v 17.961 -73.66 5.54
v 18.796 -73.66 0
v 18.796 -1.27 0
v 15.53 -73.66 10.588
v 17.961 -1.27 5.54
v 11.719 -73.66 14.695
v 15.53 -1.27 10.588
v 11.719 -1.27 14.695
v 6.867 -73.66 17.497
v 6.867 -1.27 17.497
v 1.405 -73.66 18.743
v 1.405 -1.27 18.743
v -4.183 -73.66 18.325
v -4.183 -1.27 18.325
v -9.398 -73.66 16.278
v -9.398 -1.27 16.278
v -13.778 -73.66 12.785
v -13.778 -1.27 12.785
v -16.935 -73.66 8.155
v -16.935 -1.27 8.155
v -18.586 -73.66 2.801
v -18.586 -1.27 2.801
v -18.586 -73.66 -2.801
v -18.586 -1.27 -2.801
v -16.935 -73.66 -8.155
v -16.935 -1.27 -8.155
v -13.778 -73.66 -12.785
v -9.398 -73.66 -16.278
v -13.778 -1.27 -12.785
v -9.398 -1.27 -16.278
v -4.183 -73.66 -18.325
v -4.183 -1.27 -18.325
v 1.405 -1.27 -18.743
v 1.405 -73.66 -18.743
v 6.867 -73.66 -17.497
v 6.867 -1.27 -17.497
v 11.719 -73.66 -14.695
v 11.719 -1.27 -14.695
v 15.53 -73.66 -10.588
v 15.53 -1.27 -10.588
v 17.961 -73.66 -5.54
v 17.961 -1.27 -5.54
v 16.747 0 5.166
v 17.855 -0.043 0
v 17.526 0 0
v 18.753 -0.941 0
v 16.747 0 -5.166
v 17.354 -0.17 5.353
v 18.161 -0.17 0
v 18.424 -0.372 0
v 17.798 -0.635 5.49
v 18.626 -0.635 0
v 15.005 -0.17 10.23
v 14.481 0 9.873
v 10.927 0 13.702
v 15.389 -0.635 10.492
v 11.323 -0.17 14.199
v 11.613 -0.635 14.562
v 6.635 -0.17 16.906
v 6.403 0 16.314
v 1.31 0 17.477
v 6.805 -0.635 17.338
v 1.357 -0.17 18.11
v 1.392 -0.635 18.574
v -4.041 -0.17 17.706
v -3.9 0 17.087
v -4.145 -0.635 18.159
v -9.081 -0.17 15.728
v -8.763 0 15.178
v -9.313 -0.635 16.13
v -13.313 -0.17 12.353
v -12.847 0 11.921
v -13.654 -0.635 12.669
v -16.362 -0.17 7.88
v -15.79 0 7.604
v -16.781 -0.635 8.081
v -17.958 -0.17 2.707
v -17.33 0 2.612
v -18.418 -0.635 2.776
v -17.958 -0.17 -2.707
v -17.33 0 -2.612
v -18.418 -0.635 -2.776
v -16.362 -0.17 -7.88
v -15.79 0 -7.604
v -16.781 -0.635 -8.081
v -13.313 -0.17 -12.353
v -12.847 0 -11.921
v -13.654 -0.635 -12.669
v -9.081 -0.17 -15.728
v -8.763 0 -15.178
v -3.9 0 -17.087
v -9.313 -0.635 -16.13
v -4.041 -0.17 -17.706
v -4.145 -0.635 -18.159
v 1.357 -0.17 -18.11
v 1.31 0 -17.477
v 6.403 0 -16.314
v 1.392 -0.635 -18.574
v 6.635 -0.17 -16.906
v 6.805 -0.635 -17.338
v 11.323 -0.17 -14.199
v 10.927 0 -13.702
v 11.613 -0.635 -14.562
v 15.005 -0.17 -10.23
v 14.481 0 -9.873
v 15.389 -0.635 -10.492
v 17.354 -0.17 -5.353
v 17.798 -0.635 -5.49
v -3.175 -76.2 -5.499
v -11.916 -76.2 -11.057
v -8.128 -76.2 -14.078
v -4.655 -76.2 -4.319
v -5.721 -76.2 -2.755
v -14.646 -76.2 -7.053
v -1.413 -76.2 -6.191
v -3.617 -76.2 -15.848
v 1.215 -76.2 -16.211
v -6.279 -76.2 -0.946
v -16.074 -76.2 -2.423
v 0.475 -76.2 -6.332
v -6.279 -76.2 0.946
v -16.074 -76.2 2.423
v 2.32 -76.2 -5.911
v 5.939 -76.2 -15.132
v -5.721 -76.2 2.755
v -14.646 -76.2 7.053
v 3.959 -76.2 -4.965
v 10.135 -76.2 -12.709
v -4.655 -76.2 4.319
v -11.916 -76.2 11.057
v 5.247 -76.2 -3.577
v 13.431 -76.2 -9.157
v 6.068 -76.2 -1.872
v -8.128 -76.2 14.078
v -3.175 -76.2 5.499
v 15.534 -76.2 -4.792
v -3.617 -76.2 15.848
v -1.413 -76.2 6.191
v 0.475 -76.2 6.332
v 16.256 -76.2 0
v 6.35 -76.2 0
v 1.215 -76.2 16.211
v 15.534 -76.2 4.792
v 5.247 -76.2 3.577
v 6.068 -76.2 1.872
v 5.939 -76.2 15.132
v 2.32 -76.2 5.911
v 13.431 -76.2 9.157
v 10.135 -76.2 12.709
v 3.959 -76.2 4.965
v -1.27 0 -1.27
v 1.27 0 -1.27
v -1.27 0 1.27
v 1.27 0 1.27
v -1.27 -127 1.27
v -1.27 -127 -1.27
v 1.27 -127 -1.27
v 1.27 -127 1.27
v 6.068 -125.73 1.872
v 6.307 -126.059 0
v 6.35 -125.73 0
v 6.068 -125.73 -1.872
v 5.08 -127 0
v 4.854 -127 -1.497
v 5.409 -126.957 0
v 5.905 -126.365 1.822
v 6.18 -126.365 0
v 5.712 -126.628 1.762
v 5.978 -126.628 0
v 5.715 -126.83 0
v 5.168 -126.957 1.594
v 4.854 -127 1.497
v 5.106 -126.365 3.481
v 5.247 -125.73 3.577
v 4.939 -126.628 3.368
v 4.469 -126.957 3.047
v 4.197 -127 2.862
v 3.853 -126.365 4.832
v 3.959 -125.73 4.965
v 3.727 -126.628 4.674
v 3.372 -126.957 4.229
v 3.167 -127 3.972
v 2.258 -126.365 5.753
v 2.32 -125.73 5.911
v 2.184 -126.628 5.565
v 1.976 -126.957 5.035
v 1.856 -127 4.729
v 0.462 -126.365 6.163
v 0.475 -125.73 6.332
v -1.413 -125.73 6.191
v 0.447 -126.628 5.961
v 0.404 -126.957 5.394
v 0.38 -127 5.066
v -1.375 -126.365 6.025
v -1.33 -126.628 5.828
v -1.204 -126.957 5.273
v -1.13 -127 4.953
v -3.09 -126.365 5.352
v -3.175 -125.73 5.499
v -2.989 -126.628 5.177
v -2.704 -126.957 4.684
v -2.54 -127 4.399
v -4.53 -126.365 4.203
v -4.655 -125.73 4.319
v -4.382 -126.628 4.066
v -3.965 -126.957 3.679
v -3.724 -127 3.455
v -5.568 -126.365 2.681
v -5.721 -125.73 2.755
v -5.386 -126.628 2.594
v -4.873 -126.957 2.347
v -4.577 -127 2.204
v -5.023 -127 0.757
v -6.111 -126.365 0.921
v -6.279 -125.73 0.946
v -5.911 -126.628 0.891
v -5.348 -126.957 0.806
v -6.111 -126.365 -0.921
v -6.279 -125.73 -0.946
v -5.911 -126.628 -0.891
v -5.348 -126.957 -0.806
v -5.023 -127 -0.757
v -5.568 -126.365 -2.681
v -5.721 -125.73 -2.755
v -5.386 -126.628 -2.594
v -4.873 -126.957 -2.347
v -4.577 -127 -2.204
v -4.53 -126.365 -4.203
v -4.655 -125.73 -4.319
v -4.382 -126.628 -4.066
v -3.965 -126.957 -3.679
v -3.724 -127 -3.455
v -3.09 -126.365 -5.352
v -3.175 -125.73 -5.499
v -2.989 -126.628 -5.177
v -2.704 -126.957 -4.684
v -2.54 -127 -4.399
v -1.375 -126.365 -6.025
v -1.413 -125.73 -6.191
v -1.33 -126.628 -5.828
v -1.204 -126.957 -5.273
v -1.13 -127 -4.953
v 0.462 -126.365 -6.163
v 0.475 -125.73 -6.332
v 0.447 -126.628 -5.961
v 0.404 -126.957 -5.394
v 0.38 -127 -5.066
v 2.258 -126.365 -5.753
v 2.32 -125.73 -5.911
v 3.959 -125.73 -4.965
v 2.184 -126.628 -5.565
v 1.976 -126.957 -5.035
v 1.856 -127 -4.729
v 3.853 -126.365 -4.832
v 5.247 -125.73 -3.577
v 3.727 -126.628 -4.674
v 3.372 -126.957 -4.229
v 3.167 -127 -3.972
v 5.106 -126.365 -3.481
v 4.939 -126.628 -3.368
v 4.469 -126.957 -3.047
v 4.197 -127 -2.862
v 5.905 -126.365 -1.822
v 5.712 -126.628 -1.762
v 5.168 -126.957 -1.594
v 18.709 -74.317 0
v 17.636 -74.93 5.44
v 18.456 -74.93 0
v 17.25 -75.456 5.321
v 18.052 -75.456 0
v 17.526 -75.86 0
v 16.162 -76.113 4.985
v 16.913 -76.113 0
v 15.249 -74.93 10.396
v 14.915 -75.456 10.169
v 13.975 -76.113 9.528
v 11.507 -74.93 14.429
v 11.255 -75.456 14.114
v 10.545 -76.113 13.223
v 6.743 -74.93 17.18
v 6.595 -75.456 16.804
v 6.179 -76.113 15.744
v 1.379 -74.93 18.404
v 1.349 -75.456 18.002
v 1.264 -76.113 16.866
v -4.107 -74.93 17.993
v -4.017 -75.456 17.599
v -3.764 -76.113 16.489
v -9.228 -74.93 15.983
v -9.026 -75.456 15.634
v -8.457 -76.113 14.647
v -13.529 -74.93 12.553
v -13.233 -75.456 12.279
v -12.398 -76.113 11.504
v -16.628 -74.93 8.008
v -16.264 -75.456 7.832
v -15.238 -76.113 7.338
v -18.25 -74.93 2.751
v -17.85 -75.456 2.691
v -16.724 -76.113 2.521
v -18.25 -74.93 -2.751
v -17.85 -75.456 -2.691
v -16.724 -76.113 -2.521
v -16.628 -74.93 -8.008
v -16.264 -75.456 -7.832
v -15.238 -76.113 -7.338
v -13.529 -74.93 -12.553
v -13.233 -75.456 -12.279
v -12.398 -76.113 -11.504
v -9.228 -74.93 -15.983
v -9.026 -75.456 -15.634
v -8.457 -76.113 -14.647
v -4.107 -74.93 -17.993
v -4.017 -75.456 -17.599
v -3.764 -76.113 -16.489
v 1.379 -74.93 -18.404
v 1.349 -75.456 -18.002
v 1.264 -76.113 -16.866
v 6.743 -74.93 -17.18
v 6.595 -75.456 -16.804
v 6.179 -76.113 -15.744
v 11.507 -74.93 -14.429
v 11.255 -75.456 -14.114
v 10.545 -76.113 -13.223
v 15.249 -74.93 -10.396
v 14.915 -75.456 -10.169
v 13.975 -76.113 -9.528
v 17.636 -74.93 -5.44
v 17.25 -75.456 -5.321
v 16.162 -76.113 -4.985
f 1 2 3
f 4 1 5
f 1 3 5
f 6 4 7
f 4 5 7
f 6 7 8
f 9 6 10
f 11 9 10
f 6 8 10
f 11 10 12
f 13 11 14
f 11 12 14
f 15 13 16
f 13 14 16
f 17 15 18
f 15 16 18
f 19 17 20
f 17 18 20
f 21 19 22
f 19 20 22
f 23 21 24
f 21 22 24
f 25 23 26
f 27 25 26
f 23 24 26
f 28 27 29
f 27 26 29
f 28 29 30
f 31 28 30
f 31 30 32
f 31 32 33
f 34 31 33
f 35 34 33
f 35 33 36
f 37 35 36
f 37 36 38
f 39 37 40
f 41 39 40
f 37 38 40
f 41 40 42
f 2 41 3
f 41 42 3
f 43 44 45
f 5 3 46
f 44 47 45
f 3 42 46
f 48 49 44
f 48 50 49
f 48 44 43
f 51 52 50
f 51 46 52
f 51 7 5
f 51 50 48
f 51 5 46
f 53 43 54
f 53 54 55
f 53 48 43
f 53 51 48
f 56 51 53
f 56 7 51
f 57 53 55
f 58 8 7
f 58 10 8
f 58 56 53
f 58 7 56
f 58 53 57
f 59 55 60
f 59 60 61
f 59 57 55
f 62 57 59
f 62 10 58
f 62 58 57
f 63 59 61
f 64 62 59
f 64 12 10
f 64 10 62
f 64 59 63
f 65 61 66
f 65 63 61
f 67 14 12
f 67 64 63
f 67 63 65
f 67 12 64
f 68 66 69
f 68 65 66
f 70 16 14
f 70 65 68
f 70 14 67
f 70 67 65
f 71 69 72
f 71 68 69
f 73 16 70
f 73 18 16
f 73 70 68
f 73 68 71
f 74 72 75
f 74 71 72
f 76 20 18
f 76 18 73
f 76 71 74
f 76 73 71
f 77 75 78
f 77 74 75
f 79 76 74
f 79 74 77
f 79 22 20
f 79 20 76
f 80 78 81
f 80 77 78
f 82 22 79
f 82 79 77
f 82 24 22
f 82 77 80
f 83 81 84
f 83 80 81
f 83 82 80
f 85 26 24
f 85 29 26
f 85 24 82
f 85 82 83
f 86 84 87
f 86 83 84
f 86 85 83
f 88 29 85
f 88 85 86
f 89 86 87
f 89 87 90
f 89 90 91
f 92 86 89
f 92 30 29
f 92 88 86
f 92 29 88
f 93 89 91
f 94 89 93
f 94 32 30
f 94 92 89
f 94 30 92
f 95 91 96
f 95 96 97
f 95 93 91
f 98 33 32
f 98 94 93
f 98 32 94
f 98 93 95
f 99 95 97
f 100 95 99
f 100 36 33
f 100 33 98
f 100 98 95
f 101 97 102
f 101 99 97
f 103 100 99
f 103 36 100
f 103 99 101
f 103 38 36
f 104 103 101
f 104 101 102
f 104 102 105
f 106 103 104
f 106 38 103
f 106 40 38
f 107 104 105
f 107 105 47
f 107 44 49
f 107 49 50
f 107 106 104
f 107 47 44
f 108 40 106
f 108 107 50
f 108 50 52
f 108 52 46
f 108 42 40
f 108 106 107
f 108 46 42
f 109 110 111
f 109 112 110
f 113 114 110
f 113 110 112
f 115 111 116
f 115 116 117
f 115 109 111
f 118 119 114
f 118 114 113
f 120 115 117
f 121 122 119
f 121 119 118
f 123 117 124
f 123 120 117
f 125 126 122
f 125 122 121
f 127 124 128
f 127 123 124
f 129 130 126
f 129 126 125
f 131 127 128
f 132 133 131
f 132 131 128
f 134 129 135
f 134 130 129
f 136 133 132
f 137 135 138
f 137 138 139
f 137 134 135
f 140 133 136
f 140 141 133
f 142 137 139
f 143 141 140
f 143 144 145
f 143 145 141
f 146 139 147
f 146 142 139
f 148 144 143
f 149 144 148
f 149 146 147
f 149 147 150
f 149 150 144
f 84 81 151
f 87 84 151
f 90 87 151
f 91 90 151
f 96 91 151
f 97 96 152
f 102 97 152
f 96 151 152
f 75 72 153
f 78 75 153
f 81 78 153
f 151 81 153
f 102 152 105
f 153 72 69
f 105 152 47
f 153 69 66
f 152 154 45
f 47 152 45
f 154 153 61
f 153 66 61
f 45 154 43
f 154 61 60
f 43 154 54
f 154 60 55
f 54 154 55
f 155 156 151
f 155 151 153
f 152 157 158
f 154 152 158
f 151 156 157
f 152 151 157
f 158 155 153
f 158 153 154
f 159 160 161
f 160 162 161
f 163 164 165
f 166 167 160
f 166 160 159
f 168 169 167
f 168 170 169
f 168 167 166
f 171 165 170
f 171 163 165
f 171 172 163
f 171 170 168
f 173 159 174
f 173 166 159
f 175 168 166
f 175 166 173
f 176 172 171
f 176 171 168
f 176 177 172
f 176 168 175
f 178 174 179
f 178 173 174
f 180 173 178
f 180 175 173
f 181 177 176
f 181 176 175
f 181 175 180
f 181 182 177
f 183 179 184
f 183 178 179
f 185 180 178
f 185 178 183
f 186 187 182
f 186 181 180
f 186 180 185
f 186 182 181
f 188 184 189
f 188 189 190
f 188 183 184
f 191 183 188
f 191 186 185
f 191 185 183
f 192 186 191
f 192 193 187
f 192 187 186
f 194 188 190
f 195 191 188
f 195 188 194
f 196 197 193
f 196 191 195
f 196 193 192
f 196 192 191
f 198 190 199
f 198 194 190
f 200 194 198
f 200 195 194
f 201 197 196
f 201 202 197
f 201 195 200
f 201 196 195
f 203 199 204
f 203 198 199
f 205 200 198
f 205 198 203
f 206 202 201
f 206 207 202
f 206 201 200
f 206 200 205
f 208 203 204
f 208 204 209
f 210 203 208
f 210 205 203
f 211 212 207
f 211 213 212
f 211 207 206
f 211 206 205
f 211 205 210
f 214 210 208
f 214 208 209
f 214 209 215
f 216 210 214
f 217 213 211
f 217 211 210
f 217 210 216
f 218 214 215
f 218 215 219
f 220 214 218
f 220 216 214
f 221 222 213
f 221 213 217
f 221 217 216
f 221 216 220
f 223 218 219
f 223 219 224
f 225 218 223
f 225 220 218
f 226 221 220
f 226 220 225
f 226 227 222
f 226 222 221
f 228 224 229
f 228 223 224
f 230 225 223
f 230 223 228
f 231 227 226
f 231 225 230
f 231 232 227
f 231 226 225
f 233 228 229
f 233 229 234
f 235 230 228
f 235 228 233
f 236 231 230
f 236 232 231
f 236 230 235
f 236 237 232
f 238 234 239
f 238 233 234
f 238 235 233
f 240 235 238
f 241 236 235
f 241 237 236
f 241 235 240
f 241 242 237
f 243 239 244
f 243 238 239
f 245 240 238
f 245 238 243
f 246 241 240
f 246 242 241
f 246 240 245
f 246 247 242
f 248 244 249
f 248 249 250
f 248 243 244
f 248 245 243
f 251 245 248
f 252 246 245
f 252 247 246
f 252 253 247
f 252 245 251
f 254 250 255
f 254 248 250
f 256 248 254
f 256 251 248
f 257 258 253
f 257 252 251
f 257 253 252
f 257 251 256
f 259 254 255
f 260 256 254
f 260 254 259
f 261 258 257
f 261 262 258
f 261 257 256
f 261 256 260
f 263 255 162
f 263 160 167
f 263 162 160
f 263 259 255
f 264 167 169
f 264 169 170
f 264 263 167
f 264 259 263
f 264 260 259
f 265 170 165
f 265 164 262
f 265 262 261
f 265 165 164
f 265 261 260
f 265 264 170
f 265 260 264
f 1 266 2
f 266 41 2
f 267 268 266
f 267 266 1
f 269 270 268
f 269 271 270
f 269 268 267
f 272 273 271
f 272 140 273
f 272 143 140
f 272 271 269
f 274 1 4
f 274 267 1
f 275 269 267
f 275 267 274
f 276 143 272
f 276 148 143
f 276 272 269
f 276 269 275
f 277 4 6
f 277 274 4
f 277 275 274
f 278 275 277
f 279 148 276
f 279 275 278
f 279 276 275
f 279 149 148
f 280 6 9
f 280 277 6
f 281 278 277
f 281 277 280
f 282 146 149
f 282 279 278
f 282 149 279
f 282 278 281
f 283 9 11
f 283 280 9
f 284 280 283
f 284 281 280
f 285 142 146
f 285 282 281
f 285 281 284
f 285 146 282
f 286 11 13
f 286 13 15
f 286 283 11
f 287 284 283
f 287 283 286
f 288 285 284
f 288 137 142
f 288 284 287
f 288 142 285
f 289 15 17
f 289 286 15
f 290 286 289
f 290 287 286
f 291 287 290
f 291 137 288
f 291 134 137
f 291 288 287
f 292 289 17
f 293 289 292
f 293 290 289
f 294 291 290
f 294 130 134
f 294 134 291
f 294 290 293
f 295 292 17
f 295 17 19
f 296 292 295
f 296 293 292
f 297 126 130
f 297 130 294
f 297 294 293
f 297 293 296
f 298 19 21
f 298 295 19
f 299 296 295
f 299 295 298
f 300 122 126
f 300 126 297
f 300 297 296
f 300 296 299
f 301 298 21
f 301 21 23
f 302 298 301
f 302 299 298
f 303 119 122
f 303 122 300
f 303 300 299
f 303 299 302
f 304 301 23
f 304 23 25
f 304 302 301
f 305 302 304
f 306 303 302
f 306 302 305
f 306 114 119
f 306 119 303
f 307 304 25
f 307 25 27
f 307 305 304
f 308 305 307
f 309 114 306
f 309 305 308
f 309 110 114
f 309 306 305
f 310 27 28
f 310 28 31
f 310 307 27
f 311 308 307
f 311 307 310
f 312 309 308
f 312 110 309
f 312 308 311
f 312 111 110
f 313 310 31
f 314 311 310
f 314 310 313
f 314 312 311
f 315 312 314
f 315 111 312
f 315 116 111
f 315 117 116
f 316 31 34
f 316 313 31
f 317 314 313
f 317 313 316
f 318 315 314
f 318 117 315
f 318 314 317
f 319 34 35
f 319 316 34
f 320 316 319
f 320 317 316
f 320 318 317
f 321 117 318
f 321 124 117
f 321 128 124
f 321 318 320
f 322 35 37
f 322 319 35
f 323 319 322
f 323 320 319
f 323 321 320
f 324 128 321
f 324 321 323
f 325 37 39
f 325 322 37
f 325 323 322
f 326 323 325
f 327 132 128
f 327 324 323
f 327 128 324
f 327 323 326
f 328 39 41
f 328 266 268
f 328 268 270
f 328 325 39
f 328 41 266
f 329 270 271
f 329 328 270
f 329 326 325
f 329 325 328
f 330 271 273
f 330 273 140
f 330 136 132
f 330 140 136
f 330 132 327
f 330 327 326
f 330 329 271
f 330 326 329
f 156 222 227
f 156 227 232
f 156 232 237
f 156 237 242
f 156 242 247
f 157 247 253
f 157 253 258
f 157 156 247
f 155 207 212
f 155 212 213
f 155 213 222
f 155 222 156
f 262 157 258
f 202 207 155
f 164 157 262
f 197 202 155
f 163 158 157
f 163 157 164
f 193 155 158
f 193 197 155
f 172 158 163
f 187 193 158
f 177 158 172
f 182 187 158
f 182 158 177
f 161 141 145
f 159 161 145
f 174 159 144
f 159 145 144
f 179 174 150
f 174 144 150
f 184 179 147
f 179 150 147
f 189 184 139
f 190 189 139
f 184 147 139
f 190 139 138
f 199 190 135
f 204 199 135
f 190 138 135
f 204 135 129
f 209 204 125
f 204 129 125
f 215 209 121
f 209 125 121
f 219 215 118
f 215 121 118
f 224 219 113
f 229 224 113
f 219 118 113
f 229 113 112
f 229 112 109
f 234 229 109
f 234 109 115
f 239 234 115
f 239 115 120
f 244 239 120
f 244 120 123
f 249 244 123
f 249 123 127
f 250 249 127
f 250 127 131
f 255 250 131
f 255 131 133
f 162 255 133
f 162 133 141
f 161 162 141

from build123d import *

# Parameters (mm, degrees)
F0_R     = 18.796
F2_DEPTH = 76.2
F1_R     = 6.35
F3_DEPTH = 127
F4_R     = 1.27
F5_W     = 2.54
F5_H     = 2.54
F6_DEPTH = 127
F7_R     = 2.54


with BuildPart() as f2:
    # F0 (on Front) → F2 (new body)
    with BuildSketch(Plane.XZ):
        Circle(F0_R)
    extrude(amount=F2_DEPTH)

    # F1 (on face) → F3 (join)
    with BuildSketch(Plane.XZ):
        Circle(F1_R)
    extrude(amount=F3_DEPTH)

    # F4
    f4_edges = [f2.edges().sort_by_distance(p)[0] for p in [
        (-18.796, 0, 0),
        (-6.35, -127, 0),
    ]]
    fillet(f4_edges, radius=F4_R)

    # F5 (on face) → F6 (cut)
    with BuildSketch(Plane.XZ.offset(127)):
        Rectangle(F5_W, F5_H)
    extrude(amount=-F6_DEPTH, mode=Mode.SUBTRACT)

    # F7
    f7_edges = [f2.edges().sort_by_distance(p)[0] for p in [
        (-18.796, -76.2, 0),
    ]]
    fillet(f7_edges, radius=F7_R)


solid = f2.part
